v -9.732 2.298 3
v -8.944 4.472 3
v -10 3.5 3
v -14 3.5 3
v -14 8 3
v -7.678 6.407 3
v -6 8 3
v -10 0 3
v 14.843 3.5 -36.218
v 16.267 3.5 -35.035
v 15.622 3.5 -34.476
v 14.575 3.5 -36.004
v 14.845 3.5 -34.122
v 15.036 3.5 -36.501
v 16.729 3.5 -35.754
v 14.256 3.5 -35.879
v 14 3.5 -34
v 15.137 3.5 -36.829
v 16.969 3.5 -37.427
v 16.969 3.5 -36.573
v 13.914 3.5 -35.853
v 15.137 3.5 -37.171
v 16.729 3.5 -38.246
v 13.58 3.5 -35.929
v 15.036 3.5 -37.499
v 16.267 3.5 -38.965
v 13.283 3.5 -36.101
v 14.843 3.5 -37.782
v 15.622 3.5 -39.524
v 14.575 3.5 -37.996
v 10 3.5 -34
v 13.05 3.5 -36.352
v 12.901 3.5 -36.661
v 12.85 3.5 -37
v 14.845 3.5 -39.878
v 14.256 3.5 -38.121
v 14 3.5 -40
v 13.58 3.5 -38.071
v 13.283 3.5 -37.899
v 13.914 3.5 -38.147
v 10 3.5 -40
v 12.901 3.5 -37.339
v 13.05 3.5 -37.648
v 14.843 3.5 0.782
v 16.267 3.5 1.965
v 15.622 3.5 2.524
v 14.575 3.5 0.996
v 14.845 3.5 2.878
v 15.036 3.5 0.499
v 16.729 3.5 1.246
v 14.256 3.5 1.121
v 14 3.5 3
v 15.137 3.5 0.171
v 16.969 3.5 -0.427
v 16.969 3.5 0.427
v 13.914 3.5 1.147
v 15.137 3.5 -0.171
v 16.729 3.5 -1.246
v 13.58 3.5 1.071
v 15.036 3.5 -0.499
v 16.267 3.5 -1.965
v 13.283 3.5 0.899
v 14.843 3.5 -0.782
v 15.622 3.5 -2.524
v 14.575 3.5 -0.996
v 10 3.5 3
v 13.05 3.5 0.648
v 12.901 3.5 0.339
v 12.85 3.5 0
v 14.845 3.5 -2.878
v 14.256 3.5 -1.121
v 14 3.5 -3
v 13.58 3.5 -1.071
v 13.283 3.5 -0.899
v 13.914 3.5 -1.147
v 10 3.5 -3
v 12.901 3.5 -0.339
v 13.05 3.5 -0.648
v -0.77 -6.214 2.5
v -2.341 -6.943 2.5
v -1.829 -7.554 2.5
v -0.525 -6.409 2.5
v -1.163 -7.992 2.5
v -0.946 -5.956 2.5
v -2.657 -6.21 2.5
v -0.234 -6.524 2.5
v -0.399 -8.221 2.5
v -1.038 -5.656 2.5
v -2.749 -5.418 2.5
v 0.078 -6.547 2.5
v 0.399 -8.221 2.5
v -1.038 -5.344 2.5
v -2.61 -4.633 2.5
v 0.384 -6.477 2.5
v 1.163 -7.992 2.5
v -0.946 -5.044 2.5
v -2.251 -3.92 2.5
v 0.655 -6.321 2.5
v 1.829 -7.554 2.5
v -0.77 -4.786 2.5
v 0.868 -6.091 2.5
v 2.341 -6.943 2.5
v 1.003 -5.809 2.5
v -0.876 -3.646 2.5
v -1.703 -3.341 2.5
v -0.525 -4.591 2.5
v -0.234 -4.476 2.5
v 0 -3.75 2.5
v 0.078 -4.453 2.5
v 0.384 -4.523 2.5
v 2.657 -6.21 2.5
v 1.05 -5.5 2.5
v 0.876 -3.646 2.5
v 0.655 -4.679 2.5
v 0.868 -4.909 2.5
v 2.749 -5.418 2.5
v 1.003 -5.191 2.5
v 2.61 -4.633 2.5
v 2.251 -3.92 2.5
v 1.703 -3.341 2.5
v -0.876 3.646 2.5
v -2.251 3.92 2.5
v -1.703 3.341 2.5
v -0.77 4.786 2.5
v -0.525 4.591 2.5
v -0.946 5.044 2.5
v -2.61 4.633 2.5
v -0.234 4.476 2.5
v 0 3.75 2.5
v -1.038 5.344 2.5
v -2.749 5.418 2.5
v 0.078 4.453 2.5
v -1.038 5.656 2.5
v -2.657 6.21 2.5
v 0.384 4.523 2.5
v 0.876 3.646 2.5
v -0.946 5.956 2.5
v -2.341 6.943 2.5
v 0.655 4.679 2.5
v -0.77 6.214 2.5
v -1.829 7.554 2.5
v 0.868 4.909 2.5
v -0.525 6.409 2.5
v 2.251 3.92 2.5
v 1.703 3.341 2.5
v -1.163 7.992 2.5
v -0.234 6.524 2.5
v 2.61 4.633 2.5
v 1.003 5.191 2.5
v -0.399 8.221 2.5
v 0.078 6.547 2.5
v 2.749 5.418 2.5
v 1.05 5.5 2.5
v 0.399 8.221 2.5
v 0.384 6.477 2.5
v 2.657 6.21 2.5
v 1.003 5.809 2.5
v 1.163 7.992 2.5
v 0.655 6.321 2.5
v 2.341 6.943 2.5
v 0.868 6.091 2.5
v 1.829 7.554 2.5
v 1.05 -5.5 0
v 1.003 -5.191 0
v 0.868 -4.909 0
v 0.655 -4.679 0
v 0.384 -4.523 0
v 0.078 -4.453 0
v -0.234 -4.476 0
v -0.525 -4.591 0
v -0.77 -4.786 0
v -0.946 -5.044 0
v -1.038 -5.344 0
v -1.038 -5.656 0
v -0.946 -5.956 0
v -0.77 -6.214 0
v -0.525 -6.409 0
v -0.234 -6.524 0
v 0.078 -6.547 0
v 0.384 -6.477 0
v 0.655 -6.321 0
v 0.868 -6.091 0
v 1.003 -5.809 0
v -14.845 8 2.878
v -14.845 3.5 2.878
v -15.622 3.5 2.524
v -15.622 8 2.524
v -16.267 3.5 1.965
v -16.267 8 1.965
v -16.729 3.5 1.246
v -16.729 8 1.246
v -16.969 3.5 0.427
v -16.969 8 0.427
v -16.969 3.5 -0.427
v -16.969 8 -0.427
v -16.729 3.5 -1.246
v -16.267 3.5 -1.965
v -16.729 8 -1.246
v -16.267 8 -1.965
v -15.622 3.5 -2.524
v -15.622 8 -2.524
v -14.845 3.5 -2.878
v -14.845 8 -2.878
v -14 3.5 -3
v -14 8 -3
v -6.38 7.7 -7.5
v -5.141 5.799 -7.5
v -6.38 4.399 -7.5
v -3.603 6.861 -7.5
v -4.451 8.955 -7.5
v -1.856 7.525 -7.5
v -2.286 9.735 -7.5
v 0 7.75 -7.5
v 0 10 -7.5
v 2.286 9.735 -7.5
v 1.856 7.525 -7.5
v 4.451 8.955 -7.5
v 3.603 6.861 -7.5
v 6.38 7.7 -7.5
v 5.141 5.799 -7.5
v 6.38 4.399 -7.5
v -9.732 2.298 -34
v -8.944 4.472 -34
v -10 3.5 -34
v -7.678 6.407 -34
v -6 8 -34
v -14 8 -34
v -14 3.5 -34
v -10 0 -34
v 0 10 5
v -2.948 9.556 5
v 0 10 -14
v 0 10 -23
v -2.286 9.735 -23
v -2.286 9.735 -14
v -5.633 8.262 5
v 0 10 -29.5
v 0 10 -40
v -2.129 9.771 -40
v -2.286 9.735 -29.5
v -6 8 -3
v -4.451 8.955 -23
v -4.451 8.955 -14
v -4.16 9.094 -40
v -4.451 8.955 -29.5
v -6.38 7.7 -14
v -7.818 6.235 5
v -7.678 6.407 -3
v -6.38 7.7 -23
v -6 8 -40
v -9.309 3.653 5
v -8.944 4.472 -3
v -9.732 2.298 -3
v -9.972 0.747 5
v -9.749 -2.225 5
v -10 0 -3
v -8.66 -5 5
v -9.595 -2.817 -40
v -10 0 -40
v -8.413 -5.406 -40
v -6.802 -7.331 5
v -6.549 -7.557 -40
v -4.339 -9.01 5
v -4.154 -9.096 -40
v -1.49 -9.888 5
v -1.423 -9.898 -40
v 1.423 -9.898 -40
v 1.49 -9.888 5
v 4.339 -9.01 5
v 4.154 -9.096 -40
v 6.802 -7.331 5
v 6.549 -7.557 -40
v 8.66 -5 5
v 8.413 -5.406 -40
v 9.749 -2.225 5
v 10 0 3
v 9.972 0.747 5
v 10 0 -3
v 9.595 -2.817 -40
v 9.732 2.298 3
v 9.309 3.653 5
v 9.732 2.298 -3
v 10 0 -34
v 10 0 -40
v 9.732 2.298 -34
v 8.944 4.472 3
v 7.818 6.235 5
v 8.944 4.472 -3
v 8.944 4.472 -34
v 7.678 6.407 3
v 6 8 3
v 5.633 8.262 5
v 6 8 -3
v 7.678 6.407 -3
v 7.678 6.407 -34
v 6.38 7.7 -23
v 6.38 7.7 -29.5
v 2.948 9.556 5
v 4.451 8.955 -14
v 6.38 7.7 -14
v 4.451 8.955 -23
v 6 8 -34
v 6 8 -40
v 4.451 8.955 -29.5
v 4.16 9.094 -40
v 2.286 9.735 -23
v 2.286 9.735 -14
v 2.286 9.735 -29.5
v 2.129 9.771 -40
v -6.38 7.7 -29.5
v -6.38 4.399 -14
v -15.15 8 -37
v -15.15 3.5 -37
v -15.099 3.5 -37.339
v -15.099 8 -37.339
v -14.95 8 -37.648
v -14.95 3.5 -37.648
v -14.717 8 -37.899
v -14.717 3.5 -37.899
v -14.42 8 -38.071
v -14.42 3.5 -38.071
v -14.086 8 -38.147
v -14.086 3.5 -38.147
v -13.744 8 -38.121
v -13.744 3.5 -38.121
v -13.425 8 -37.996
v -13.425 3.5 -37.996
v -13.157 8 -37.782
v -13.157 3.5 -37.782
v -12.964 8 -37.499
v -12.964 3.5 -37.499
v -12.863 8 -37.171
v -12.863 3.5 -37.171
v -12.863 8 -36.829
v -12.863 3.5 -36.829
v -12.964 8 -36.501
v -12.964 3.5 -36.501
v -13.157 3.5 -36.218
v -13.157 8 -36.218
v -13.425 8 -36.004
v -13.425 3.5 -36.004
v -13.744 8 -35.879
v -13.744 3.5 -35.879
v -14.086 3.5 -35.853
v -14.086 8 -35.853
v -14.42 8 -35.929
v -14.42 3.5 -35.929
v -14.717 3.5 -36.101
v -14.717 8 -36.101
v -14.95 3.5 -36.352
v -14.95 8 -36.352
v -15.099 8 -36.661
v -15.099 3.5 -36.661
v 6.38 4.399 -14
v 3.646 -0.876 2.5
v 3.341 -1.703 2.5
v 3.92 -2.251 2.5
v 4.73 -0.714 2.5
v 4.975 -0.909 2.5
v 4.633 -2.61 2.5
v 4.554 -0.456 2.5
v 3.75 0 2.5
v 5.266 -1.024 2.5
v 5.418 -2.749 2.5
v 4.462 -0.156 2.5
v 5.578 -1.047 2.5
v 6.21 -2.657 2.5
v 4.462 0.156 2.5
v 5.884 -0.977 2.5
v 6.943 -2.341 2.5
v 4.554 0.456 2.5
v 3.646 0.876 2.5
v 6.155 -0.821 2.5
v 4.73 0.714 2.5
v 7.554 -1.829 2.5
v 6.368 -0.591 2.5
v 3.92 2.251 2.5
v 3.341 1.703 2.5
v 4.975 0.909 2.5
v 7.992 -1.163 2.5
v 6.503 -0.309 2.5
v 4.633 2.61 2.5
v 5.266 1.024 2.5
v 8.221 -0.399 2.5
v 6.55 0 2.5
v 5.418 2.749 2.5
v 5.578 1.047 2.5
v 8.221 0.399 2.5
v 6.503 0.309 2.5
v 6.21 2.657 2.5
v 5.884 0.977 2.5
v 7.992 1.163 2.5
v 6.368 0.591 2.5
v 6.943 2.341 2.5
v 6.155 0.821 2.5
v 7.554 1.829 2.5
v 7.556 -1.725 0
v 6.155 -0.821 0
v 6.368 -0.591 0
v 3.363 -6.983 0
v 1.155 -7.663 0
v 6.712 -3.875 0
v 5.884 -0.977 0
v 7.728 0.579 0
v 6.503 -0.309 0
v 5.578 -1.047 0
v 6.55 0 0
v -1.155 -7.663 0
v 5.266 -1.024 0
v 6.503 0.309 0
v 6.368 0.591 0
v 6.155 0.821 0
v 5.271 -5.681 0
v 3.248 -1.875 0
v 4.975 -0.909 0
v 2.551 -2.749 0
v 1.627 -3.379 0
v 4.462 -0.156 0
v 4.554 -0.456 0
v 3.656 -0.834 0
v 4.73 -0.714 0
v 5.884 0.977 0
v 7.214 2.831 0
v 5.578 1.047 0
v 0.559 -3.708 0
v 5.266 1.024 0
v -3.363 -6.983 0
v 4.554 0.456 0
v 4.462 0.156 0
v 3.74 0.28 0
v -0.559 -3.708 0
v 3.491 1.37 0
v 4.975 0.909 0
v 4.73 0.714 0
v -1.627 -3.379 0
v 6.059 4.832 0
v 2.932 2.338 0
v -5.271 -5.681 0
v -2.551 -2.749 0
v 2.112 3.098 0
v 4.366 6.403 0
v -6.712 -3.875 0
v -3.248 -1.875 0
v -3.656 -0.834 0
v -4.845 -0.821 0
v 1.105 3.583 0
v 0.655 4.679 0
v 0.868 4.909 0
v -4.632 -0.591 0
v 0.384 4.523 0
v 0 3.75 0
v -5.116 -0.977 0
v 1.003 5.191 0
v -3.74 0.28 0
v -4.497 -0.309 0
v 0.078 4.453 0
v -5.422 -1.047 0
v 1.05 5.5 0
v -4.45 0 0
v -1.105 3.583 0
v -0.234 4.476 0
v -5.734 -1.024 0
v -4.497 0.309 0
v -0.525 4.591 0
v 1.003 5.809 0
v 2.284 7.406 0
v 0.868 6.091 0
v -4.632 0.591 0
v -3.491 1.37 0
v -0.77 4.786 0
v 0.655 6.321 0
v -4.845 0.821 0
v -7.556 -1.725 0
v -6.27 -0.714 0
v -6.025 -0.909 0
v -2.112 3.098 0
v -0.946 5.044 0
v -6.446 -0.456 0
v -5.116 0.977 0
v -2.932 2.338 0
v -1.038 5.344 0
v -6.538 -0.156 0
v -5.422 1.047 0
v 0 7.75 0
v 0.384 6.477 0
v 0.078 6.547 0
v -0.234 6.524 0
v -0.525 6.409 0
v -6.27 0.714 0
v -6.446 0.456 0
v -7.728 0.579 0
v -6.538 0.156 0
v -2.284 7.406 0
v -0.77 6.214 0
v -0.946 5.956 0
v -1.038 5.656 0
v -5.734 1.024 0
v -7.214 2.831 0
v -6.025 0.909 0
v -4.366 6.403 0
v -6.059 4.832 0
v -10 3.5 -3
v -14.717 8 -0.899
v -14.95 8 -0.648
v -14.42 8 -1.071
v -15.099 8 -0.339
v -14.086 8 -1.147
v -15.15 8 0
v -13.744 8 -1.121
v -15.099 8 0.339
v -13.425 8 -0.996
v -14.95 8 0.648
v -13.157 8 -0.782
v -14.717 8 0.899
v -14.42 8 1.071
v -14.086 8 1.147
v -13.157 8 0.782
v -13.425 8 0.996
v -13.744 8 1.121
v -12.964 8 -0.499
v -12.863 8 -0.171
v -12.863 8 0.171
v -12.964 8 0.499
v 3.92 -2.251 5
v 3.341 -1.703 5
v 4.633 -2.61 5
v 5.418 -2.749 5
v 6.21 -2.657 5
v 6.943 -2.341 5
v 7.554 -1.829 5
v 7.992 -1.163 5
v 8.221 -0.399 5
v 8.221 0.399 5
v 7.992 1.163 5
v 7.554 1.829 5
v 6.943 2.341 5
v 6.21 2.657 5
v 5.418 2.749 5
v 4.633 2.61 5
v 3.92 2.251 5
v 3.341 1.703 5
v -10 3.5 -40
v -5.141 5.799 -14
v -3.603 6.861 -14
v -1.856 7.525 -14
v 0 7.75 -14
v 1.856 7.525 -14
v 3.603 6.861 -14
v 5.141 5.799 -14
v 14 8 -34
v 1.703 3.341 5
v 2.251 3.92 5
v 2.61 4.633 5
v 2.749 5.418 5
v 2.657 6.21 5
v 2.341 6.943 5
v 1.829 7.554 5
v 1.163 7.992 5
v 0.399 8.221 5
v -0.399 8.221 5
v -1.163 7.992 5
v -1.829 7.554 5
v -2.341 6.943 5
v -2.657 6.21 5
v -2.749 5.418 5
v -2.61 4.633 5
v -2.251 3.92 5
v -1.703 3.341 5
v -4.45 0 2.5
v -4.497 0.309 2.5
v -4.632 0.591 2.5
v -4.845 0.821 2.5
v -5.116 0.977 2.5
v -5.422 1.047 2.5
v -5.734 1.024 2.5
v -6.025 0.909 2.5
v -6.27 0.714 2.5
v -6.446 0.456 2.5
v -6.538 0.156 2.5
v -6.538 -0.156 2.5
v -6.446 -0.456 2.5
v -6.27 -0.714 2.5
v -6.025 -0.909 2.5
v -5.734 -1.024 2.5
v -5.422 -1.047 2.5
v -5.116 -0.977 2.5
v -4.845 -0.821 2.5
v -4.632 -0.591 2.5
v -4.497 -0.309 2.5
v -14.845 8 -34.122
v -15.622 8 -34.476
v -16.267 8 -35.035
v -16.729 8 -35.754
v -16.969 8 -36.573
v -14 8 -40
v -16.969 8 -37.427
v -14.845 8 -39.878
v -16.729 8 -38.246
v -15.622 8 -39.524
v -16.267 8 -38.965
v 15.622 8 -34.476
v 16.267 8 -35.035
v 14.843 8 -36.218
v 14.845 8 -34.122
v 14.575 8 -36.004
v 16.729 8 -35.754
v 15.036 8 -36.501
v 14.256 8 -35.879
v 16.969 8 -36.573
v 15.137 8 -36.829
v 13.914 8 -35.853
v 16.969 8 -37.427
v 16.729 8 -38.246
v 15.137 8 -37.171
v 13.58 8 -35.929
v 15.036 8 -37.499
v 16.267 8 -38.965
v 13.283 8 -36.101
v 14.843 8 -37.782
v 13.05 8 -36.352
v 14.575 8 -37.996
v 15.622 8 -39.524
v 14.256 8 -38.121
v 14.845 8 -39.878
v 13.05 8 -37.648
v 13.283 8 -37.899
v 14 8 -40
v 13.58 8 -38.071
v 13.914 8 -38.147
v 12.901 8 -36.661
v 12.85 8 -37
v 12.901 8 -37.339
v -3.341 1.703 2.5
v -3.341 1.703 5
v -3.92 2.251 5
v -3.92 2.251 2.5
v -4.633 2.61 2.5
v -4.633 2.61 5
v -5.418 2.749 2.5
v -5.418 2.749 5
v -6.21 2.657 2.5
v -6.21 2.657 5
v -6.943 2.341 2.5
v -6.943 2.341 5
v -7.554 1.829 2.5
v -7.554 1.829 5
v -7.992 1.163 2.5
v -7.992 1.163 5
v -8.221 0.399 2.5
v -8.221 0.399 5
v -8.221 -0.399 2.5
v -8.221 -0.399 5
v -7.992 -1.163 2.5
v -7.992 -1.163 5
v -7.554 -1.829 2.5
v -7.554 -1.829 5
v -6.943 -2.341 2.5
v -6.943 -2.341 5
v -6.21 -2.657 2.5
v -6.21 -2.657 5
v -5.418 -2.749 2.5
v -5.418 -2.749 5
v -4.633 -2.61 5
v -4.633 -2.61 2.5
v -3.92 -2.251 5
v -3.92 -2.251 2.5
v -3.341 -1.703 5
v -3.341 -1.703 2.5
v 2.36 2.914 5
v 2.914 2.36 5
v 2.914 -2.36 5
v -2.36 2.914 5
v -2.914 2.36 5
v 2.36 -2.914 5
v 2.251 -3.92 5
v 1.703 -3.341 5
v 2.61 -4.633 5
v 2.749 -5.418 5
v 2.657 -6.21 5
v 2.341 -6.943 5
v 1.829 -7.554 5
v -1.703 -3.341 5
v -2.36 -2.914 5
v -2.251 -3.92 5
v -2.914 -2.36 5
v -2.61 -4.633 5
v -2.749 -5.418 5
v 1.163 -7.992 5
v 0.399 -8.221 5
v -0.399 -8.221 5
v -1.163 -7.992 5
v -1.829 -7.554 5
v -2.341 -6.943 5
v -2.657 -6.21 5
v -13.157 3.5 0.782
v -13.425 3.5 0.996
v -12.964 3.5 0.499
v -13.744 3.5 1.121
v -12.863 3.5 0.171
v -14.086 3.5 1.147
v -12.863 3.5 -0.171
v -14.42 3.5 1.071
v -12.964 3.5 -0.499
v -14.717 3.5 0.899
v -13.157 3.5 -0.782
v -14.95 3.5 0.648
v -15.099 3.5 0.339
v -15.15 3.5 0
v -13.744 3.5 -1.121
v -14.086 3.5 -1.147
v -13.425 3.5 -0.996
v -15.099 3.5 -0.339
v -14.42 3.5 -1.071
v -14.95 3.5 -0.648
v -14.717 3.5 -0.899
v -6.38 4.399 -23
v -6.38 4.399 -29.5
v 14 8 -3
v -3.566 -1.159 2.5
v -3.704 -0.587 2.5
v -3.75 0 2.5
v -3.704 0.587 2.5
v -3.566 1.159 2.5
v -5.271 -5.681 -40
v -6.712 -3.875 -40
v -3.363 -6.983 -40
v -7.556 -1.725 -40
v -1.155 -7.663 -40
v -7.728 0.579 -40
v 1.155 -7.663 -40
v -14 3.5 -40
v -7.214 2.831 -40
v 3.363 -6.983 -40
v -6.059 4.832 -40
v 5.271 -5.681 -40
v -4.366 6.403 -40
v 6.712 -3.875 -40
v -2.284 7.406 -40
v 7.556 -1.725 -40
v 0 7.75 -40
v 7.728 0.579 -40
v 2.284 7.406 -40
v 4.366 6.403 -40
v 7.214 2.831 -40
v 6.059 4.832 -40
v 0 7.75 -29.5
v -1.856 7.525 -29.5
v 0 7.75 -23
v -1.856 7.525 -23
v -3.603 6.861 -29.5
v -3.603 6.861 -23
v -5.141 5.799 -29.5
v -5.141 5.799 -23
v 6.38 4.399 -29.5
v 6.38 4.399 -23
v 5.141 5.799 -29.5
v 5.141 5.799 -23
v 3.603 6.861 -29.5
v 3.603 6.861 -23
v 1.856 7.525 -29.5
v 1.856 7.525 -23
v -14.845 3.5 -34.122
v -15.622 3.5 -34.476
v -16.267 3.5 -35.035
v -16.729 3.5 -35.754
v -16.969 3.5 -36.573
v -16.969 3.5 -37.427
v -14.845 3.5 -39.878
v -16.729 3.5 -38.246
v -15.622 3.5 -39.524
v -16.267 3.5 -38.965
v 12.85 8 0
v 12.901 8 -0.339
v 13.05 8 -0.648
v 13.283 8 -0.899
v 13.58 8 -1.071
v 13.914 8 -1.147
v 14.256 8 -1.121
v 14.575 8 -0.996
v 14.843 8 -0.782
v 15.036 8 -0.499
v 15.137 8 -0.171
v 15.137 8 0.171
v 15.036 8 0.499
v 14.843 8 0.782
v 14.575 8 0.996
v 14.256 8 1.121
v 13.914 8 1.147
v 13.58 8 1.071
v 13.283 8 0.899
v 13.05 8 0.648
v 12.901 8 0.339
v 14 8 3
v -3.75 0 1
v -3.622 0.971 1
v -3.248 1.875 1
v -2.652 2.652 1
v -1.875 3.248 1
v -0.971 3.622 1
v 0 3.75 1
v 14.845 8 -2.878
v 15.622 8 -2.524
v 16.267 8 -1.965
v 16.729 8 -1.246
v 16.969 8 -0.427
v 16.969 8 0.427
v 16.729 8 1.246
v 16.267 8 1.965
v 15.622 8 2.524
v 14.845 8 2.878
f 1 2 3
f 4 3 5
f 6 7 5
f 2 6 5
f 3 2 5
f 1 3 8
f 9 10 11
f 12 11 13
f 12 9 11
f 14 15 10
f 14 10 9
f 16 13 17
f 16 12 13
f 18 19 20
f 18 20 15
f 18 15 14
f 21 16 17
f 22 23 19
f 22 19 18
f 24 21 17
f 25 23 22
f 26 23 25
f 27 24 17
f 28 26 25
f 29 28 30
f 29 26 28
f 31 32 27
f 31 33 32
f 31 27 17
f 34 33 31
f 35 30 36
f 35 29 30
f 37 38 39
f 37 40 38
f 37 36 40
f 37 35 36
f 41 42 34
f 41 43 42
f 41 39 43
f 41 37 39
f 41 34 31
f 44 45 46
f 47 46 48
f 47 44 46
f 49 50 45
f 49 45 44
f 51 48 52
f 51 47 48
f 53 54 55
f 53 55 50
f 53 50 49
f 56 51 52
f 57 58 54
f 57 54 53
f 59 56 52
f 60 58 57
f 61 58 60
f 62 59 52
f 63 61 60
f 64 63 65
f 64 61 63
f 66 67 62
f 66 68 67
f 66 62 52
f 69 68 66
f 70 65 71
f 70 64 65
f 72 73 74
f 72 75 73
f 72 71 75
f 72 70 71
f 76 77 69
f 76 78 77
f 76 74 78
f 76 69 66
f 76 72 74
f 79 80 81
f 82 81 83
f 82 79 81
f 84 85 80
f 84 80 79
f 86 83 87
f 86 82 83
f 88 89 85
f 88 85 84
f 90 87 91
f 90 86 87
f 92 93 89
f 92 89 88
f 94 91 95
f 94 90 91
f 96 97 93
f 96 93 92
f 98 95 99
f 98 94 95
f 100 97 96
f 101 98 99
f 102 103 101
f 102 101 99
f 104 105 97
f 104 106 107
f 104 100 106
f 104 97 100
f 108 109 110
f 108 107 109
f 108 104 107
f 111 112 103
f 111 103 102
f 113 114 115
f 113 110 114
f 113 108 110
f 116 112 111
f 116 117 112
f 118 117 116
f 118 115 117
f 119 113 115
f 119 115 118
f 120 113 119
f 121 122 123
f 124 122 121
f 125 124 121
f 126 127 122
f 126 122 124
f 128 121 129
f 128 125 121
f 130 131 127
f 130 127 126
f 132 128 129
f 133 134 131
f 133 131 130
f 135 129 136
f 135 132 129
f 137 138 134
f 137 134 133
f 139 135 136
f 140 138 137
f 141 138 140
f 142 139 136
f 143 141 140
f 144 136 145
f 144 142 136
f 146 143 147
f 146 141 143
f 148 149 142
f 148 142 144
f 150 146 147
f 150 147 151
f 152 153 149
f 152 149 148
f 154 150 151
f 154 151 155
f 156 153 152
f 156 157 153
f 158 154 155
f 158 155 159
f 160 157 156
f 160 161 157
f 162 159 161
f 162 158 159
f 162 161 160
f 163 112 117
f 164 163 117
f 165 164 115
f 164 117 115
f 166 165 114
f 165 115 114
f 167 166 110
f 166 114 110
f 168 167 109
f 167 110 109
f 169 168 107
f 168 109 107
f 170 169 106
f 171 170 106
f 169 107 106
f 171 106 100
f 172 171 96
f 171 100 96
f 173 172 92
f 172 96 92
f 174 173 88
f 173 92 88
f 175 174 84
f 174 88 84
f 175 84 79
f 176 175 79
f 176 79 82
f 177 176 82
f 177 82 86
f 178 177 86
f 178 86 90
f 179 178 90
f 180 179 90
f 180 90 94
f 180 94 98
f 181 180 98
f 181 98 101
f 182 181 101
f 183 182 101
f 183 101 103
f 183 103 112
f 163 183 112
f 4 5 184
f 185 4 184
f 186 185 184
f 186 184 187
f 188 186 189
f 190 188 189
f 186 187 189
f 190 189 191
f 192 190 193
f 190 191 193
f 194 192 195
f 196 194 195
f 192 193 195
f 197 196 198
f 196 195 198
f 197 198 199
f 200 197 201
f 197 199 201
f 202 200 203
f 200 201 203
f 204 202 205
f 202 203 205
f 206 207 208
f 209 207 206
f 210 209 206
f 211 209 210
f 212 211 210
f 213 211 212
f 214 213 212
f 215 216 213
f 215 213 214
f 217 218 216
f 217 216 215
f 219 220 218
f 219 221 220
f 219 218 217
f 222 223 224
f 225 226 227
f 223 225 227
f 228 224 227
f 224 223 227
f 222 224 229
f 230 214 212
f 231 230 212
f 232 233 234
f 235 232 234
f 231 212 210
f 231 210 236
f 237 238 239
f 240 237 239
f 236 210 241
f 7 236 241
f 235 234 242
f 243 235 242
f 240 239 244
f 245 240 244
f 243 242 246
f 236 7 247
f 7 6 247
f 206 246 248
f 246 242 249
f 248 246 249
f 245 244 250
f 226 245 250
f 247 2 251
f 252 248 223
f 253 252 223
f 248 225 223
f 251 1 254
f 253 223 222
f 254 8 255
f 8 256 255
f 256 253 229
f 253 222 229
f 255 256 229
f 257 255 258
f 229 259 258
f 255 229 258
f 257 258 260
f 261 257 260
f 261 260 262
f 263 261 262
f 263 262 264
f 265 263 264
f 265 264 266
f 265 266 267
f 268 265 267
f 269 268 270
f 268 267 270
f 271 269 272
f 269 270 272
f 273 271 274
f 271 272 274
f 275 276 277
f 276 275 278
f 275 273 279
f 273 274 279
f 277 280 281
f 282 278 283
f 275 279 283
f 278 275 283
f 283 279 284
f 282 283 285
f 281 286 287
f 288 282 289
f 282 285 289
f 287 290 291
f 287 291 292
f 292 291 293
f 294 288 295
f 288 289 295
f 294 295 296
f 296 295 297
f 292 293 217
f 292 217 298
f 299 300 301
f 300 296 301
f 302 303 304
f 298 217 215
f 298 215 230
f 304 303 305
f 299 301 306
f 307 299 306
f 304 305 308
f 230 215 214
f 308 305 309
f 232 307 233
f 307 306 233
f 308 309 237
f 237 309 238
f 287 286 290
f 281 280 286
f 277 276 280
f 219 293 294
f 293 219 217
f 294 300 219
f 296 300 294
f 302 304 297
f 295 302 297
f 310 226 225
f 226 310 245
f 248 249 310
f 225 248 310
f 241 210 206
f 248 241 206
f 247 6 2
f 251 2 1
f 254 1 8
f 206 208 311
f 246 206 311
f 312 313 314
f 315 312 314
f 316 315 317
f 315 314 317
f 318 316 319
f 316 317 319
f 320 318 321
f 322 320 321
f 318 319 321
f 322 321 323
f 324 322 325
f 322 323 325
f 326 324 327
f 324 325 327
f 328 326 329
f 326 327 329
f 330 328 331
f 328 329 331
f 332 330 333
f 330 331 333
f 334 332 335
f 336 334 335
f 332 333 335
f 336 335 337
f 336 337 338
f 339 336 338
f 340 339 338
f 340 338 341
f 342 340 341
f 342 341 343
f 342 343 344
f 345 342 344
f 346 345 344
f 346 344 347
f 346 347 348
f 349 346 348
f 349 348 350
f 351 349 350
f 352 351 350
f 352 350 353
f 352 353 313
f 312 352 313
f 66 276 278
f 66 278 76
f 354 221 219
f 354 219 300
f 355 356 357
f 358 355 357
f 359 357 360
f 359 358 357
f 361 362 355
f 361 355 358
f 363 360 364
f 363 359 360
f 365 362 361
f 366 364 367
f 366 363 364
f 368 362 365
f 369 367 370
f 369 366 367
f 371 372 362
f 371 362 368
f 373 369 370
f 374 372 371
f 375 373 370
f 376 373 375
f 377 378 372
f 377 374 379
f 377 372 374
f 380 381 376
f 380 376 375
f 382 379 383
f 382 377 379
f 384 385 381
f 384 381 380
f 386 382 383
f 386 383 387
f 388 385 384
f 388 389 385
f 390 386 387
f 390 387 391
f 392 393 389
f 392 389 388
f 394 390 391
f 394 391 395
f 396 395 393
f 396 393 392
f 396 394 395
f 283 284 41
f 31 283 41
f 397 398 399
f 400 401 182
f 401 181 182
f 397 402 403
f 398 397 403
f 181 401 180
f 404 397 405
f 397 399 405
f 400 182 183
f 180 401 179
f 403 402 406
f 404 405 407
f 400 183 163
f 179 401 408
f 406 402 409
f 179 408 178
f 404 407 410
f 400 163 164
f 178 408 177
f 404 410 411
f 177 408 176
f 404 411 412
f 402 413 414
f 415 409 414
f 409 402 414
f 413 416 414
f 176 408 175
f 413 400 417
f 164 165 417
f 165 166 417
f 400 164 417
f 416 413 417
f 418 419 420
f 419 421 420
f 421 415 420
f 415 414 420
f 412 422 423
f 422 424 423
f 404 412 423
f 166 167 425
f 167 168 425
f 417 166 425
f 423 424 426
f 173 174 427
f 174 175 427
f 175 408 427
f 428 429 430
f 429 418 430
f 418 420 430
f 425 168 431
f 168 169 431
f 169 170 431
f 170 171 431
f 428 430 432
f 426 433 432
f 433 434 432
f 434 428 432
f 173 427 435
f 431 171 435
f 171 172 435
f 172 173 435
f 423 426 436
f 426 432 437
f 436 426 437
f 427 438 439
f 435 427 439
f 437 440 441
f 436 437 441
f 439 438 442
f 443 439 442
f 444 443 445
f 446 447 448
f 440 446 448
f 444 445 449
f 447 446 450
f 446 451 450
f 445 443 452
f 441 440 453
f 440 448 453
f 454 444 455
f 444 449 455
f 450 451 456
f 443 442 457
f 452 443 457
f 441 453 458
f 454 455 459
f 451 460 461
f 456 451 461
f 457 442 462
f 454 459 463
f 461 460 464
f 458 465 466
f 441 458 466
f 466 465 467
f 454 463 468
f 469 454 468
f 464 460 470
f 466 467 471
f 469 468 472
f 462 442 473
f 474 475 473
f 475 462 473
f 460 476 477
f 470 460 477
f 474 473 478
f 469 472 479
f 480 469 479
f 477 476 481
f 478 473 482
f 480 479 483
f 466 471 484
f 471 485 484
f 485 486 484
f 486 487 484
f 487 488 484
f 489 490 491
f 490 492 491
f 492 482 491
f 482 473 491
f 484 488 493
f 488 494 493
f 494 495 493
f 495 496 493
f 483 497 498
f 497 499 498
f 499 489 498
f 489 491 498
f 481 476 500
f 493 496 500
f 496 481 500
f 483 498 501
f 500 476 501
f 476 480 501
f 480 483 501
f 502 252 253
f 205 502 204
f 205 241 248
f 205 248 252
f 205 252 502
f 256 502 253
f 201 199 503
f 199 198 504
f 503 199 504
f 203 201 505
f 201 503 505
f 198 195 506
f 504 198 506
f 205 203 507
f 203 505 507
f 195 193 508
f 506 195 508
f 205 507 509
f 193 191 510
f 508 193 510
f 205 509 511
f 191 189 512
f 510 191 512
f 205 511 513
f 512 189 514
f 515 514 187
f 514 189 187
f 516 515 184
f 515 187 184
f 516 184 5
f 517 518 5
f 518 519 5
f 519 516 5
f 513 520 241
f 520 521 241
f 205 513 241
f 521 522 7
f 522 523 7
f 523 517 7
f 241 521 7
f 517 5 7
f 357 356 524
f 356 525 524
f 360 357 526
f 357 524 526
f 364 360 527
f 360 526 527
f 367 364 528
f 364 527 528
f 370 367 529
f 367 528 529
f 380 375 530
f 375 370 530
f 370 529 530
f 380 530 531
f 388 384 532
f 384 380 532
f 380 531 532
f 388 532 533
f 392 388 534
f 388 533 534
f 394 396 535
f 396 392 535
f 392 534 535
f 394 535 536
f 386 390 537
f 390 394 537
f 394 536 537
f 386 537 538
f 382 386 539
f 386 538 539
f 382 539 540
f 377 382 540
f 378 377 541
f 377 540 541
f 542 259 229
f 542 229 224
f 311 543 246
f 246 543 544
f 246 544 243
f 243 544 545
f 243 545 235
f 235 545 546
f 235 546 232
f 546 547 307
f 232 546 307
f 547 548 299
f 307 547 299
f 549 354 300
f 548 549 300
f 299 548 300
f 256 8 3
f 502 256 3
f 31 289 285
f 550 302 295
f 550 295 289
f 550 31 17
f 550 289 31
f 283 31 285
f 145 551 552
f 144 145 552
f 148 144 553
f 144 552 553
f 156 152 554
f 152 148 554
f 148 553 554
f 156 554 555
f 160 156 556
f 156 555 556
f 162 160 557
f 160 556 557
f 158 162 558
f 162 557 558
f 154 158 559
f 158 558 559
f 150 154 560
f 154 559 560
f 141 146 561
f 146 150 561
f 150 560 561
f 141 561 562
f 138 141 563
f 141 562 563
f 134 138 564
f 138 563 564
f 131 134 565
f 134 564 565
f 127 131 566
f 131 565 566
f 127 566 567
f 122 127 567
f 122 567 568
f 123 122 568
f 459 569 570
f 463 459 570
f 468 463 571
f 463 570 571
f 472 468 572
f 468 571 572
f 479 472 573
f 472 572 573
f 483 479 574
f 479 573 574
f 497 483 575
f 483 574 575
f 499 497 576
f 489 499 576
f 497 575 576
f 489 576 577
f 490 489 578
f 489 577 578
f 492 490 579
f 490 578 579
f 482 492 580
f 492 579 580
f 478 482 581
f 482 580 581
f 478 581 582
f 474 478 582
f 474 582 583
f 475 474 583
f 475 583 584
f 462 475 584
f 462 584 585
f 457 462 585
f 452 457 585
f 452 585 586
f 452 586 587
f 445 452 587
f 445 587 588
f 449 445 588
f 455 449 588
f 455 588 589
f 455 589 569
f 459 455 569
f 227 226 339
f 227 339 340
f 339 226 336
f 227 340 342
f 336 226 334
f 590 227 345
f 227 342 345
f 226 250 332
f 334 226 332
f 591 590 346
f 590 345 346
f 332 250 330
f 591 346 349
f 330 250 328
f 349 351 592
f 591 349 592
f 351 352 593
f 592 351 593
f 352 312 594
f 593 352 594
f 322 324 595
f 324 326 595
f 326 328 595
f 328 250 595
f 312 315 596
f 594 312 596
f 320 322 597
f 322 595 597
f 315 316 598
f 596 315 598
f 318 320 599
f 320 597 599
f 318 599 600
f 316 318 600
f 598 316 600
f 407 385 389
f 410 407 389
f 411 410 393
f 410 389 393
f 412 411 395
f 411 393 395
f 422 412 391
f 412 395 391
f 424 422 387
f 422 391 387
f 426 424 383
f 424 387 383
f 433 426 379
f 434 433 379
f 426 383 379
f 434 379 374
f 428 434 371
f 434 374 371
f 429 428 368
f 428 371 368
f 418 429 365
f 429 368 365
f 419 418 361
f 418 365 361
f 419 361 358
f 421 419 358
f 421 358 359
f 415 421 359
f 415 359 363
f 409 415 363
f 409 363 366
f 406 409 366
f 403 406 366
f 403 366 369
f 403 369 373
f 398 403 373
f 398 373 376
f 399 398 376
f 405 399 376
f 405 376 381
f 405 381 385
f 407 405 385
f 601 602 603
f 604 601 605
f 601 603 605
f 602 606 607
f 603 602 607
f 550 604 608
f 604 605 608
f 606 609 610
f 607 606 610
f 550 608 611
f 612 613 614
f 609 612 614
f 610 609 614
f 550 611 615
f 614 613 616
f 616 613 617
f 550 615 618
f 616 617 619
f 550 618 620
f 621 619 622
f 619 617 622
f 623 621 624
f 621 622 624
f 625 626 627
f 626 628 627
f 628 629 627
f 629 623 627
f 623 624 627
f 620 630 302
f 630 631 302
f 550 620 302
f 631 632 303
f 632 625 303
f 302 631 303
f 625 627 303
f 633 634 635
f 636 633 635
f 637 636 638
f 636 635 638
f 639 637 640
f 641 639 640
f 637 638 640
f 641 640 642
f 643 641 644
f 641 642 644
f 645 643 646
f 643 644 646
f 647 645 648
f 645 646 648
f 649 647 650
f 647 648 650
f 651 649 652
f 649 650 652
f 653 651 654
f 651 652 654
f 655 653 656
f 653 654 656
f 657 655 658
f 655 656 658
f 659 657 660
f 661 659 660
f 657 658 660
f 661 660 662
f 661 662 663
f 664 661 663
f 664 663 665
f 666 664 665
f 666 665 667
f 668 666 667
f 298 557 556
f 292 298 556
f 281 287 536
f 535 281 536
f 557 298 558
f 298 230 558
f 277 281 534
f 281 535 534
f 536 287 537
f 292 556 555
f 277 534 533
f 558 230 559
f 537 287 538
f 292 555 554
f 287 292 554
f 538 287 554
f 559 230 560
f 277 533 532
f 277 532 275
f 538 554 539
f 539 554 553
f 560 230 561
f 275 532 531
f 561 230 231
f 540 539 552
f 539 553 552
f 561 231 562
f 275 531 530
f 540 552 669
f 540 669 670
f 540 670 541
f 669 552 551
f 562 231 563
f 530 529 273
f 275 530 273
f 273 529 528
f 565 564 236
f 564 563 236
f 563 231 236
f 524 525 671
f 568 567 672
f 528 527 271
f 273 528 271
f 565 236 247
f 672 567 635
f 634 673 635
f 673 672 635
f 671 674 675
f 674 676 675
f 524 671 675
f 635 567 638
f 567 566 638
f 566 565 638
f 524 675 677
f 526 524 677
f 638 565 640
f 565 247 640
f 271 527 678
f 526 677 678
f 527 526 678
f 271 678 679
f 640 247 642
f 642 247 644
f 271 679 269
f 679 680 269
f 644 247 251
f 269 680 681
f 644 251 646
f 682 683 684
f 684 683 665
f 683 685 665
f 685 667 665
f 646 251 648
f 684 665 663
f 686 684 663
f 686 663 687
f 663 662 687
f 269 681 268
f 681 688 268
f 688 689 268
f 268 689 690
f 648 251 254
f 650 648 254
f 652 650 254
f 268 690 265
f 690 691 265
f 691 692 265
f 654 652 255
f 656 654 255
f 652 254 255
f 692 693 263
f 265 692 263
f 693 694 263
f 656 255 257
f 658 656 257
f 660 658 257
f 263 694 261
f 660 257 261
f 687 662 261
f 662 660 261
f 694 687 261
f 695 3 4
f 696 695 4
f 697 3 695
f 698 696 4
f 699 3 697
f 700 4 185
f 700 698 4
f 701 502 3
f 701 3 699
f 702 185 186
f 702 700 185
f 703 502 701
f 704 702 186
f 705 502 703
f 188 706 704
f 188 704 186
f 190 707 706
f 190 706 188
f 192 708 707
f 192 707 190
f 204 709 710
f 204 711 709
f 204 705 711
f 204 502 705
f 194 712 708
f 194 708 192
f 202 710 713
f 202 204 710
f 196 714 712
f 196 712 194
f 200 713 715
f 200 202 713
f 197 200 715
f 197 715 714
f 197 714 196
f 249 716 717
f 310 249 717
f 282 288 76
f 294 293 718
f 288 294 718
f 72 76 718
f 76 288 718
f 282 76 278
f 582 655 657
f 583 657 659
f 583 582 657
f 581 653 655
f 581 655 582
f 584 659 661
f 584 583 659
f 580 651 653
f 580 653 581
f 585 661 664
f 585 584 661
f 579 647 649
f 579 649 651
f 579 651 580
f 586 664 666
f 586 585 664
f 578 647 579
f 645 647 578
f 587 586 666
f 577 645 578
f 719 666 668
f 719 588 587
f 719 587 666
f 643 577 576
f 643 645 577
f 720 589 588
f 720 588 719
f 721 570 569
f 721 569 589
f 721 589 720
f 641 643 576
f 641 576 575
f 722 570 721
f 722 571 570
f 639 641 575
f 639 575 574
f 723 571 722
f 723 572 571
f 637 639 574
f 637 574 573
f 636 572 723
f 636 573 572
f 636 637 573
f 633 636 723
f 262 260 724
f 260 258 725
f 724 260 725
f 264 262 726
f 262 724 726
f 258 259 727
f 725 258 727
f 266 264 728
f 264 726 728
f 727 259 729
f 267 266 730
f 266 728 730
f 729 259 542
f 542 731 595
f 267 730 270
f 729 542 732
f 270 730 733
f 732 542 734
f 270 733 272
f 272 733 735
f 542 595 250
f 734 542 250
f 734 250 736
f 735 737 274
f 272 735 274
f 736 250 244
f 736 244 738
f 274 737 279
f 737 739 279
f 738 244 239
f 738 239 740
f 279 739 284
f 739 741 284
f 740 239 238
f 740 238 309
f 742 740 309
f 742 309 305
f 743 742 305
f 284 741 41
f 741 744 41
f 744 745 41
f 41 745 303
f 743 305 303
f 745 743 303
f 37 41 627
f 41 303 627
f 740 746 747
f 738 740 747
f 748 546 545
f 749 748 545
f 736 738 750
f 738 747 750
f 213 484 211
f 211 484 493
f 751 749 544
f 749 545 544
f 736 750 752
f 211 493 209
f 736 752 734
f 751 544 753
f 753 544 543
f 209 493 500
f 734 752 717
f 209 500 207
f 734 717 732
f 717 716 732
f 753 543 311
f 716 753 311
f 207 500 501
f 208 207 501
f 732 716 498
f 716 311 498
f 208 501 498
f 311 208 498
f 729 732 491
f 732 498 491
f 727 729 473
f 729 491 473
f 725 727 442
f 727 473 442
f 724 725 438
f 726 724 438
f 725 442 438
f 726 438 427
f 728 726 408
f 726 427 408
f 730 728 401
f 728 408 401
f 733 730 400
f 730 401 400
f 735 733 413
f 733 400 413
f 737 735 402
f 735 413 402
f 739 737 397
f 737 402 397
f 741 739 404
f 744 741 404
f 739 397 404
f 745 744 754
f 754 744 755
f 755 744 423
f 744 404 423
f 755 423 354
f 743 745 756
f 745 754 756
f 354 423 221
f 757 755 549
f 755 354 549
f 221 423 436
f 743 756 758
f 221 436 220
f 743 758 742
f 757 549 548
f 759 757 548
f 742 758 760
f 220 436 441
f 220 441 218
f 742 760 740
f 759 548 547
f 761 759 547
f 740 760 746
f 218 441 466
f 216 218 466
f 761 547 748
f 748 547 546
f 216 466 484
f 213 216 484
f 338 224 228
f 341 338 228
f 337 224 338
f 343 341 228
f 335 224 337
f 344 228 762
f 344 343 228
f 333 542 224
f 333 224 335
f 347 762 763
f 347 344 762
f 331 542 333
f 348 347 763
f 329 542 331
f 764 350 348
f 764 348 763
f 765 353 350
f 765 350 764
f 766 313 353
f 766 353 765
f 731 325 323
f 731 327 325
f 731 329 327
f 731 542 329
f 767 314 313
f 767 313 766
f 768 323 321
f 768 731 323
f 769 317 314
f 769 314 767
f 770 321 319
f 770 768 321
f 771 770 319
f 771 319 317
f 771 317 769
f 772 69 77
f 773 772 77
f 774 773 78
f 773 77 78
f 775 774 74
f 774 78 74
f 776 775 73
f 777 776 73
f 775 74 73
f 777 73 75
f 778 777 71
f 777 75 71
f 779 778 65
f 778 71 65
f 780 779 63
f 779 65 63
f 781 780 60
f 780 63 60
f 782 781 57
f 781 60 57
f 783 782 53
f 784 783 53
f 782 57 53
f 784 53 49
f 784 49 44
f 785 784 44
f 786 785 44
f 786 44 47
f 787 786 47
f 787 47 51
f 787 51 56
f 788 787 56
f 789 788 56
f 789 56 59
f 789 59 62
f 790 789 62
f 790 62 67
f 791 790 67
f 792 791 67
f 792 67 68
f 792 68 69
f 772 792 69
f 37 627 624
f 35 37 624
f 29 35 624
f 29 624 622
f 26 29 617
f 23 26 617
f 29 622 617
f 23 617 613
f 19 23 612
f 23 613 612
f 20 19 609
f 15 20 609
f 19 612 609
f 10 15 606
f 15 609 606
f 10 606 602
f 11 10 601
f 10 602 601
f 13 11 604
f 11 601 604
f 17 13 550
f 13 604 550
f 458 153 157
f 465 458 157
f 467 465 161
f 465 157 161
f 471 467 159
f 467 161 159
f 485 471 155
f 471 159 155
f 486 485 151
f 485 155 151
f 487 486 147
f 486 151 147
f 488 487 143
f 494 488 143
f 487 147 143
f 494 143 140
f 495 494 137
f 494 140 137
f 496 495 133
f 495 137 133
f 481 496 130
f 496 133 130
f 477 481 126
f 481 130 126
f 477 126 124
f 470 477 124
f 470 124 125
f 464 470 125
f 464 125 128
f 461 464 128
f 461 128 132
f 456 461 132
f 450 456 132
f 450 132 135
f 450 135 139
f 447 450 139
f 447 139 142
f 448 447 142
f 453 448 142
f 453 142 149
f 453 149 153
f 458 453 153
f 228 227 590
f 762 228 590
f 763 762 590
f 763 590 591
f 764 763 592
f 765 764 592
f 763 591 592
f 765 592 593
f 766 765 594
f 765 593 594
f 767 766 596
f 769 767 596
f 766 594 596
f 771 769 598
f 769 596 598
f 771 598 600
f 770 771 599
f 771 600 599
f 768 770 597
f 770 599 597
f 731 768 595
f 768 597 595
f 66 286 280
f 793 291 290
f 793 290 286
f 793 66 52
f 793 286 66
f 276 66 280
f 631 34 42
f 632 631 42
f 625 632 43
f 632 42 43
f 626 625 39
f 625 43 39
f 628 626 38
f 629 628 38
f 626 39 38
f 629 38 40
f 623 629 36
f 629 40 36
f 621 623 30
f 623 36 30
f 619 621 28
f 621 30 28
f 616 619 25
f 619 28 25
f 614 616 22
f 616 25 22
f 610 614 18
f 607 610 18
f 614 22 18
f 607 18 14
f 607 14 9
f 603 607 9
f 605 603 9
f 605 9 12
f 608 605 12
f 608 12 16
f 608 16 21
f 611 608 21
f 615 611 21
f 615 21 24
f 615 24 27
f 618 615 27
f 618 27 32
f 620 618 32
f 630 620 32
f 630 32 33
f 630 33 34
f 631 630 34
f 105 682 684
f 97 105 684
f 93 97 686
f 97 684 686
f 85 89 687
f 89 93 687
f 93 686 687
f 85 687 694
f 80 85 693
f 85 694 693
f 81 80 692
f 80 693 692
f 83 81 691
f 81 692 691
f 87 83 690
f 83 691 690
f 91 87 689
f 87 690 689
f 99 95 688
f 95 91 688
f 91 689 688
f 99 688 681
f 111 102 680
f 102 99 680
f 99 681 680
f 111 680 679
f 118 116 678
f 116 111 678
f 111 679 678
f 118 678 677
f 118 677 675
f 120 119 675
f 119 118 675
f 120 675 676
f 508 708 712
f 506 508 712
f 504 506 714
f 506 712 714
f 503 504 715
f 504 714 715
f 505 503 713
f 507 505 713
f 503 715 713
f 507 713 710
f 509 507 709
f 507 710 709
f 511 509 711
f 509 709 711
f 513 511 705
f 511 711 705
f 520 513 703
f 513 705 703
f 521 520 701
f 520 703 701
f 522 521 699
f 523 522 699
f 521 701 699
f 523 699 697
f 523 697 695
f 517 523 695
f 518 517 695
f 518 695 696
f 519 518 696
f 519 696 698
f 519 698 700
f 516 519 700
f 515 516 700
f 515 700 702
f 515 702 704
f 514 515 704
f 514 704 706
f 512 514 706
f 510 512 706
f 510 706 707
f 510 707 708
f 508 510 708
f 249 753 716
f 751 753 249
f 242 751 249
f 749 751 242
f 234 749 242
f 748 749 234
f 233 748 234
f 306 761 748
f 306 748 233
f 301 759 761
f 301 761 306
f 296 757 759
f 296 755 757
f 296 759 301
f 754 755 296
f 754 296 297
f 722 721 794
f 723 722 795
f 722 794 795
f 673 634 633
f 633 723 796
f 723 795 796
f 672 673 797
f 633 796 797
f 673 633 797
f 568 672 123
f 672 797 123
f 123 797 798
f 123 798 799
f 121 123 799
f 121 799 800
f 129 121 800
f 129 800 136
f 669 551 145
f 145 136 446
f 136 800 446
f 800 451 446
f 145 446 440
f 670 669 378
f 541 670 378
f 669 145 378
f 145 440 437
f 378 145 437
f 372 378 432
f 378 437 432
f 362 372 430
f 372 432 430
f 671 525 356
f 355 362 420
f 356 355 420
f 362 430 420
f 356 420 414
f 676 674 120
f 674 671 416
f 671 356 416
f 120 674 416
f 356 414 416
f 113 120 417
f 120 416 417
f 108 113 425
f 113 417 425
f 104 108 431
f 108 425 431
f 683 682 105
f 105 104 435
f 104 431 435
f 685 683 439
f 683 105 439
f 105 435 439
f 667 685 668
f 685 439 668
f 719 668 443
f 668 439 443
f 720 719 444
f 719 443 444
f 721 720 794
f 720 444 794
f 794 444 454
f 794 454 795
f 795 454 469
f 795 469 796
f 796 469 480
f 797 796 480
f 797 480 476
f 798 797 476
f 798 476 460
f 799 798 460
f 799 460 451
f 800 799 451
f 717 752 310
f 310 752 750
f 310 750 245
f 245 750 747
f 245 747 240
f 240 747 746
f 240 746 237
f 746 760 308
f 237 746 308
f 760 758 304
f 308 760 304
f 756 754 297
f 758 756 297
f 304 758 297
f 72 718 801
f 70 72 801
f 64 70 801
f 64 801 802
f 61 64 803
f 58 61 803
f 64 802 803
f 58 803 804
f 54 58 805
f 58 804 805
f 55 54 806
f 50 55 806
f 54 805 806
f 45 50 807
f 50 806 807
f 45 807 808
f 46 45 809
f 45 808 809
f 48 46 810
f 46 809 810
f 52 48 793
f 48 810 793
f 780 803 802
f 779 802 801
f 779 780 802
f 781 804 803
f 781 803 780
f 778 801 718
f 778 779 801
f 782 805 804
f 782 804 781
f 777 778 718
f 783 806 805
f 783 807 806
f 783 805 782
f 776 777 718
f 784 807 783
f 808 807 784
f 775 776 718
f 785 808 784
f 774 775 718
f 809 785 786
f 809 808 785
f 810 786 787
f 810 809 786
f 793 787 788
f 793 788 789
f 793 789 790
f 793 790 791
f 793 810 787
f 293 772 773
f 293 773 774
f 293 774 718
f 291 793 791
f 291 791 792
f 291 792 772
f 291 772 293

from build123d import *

# Parameters (mm, degrees)
SKIZZE6_R                            = 1.05
SCHNITT_LINEAR_AUSTRAGEN3_DEPTH      = 46
SKIZZE7_R                            = 2.75
SCHNITT_LINEAR_AUSTRAGEN4_DEPTH      = 2.5
AUFSATZ_LINEAR_START                 = -2
AUFSATZ_LINEAR_AUSTRAGEN6_DEPTH      = 6
AUFSATZ_LINEAR_AUSTRAGEN7_DEPTH      = 4.5
SKIZZE14_R                           = 1.15
SCHNITT_LINEAR_AUSTRAGEN5_DEPTH      = 7.5
SKIZZE17_W                           = 6.5
SKIZZE17_H                           = 2.4
SCHNITT_LINEAR_AUSTRAGEN9_DEPTH      = 18
SCHNITT_LINEAR_AUSTRAGEN9_DEPTH_BACK = 18
SCHNITT_LINEAR_START                 = -3.300852
SKIZZE18_W                           = 12.760877712
SKIZZE18_H                           = 6.5
SCHNITT_LINEAR_AUSTRAGEN10_DEPTH     = 3.300852
SKIZZE19_R                           = 3.75
SCHNITT_LINEAR_AUSTRAGEN11_DEPTH     = 6


with BuildPart() as part:
    # Skizze5 → Rotation1 (revolve)
    with BuildSketch(Plane(origin=(0, 0, 0), x_dir=(0, 0, -1), z_dir=(1, 0, 0))):
        Polygon((40, 7.75), (0, 7.75), (0, 3.75), (-1, 3.75), (-1, 3.25), (-2.6, 3.25), (-2.6, 2), (-5, 2), (-5, 10), (40, 10), align=None)
    revolve(axis=Axis((0, 0, 0), (0, 0, 1)))

    # Skizze6 → Schnitt-Linear austragen3 (cut, through all)
    with BuildSketch(Plane.XY.offset(5)):
        with Locations((0, 5.5)):
            Circle(SKIZZE6_R)
        with Locations((0, -5.5)):
            Circle(SKIZZE6_R)
        with Locations((5.5, 0)):
            Circle(SKIZZE6_R)
        with Locations((-5.5, 0)):
            Circle(SKIZZE6_R)
    extrude(amount=-SCHNITT_LINEAR_AUSTRAGEN3_DEPTH, mode=Mode.SUBTRACT)

    # Skizze7 → Schnitt-Linear austragen4 (cut)
    with BuildSketch(Plane.XY.offset(5)):
        with Locations((0, 5.5)):
            Circle(SKIZZE7_R)
        with Locations((0, -5.5)):
            Circle(SKIZZE7_R)
        with Locations((5.5, 0)):
            Circle(SKIZZE7_R)
        with Locations((-5.5, 0)):
            Circle(SKIZZE7_R)
    extrude(amount=-SCHNITT_LINEAR_AUSTRAGEN4_DEPTH, mode=Mode.SUBTRACT)

    # Skizze12 → Aufsatz-Linear austragen6 (add)
    with BuildSketch(Plane.XY.offset(5).offset(AUFSATZ_LINEAR_START)):
        with BuildLine():
            Line((-10, 0), (-10, 8))
            Line((-10, 8), (-6, 8))
            ThreePointArc((-6, 8), (-8.94427191, 4.472135955), (-10, 0))
        make_face()
        with BuildLine():
            Line((10, 8), (6, 8))
            ThreePointArc((6, 8), (8.94427191, 4.472135955), (10, 0))
            Line((10, 0), (10, 8))
        make_face()
    aufsatz_linear_austragen6 = extrude(amount=-AUFSATZ_LINEAR_AUSTRAGEN6_DEPTH)

    # Spiegeln1: Aufsatz-Linear austragen6 across plane
    add(aufsatz_linear_austragen6.mirror(Plane(origin=(0, 0, -18.5), x_dir=(1, 0, 0), z_dir=(0, 0, -1))))

    # Skizze13 → Aufsatz-Linear austragen7 (add)
    with BuildSketch(Plane(origin=(0, 8, 0), x_dir=(1, 0, 0), z_dir=(0, 1, 0))):
        with BuildLine():
            Line((-14, 40), (-10, 40))
            Line((-10, 40), (-10, 34))
            Line((-10, 34), (-14, 34))
            ThreePointArc((-14, 34), (-17, 37), (-14, 40))
        make_face()
        with BuildLine():
            Line((14, 34), (10, 34))
            Line((10, 34), (10, 40))
            Line((10, 40), (14, 40))
            ThreePointArc((14, 40), (17, 37), (14, 34))
        make_face()
        with BuildLine():
            Line((14, -3), (10, -3))
            Line((10, -3), (10, 3))
            Line((10, 3), (14, 3))
            ThreePointArc((14, 3), (17, 0), (14, -3))
        make_face()
        with BuildLine():
            Line((-14, 3), (-10, 3))
            Line((-10, 3), (-10, -3))
            Line((-10, -3), (-14, -3))
            ThreePointArc((-14, -3), (-17, 0), (-14, 3))
        make_face()
    extrude(amount=-AUFSATZ_LINEAR_AUSTRAGEN7_DEPTH)

    # Skizze14 → Schnitt-Linear austragen5 (cut, through all)
    with BuildSketch(Plane(origin=(0, 3.5, 0), x_dir=(-1, 0, 0), z_dir=(0, -1, 0))):
        with Locations((14, 0)):
            Circle(SKIZZE14_R)
        with Locations((-14, 0)):
            Circle(SKIZZE14_R)
        with Locations((-14, 37)):
            Circle(SKIZZE14_R)
        with Locations((14, 37)):
            Circle(SKIZZE14_R)
    extrude(amount=-SCHNITT_LINEAR_AUSTRAGEN5_DEPTH, mode=Mode.SUBTRACT)

    # Skizze17 → Schnitt-Linear austragen9 (cut, two sides)
    with BuildSketch(Plane(origin=(0, 0, 0), x_dir=(0, 0, -1), z_dir=(1, 0, 0))) as schnitt_linear_austragen9_sk:
        with Locations((10.75, 8.9)):
            Rectangle(SKIZZE17_W, SKIZZE17_H)
        with Locations((26.25, 8.9)):
            Rectangle(SKIZZE17_W, SKIZZE17_H)
    extrude(amount=SCHNITT_LINEAR_AUSTRAGEN9_DEPTH, mode=Mode.SUBTRACT)
    extrude(schnitt_linear_austragen9_sk.sketch, amount=-SCHNITT_LINEAR_AUSTRAGEN9_DEPTH_BACK, mode=Mode.SUBTRACT)

    # Skizze18 → Schnitt-Linear austragen10 (cut)
    with BuildSketch(Plane(origin=(0, 7.7, 0), x_dir=(1, 0, 0), z_dir=(0, 1, 0)).offset(SCHNITT_LINEAR_START)):
        with Locations((0, 10.75)):
            Rectangle(SKIZZE18_W, SKIZZE18_H)
        with Locations((0, 26.25)):
            Rectangle(SKIZZE18_W, SKIZZE18_H)
    extrude(amount=SCHNITT_LINEAR_AUSTRAGEN10_DEPTH, mode=Mode.SUBTRACT)

    # Skizze19 → Schnitt-Linear austragen11 (cut, through all)
    with BuildSketch(Plane(origin=(0, 0, 0), x_dir=(-1, 0, 0), z_dir=(0, 0, -1))):
        Circle(SKIZZE19_R)
    extrude(amount=-SCHNITT_LINEAR_AUSTRAGEN11_DEPTH, mode=Mode.SUBTRACT)


solid = part.part
